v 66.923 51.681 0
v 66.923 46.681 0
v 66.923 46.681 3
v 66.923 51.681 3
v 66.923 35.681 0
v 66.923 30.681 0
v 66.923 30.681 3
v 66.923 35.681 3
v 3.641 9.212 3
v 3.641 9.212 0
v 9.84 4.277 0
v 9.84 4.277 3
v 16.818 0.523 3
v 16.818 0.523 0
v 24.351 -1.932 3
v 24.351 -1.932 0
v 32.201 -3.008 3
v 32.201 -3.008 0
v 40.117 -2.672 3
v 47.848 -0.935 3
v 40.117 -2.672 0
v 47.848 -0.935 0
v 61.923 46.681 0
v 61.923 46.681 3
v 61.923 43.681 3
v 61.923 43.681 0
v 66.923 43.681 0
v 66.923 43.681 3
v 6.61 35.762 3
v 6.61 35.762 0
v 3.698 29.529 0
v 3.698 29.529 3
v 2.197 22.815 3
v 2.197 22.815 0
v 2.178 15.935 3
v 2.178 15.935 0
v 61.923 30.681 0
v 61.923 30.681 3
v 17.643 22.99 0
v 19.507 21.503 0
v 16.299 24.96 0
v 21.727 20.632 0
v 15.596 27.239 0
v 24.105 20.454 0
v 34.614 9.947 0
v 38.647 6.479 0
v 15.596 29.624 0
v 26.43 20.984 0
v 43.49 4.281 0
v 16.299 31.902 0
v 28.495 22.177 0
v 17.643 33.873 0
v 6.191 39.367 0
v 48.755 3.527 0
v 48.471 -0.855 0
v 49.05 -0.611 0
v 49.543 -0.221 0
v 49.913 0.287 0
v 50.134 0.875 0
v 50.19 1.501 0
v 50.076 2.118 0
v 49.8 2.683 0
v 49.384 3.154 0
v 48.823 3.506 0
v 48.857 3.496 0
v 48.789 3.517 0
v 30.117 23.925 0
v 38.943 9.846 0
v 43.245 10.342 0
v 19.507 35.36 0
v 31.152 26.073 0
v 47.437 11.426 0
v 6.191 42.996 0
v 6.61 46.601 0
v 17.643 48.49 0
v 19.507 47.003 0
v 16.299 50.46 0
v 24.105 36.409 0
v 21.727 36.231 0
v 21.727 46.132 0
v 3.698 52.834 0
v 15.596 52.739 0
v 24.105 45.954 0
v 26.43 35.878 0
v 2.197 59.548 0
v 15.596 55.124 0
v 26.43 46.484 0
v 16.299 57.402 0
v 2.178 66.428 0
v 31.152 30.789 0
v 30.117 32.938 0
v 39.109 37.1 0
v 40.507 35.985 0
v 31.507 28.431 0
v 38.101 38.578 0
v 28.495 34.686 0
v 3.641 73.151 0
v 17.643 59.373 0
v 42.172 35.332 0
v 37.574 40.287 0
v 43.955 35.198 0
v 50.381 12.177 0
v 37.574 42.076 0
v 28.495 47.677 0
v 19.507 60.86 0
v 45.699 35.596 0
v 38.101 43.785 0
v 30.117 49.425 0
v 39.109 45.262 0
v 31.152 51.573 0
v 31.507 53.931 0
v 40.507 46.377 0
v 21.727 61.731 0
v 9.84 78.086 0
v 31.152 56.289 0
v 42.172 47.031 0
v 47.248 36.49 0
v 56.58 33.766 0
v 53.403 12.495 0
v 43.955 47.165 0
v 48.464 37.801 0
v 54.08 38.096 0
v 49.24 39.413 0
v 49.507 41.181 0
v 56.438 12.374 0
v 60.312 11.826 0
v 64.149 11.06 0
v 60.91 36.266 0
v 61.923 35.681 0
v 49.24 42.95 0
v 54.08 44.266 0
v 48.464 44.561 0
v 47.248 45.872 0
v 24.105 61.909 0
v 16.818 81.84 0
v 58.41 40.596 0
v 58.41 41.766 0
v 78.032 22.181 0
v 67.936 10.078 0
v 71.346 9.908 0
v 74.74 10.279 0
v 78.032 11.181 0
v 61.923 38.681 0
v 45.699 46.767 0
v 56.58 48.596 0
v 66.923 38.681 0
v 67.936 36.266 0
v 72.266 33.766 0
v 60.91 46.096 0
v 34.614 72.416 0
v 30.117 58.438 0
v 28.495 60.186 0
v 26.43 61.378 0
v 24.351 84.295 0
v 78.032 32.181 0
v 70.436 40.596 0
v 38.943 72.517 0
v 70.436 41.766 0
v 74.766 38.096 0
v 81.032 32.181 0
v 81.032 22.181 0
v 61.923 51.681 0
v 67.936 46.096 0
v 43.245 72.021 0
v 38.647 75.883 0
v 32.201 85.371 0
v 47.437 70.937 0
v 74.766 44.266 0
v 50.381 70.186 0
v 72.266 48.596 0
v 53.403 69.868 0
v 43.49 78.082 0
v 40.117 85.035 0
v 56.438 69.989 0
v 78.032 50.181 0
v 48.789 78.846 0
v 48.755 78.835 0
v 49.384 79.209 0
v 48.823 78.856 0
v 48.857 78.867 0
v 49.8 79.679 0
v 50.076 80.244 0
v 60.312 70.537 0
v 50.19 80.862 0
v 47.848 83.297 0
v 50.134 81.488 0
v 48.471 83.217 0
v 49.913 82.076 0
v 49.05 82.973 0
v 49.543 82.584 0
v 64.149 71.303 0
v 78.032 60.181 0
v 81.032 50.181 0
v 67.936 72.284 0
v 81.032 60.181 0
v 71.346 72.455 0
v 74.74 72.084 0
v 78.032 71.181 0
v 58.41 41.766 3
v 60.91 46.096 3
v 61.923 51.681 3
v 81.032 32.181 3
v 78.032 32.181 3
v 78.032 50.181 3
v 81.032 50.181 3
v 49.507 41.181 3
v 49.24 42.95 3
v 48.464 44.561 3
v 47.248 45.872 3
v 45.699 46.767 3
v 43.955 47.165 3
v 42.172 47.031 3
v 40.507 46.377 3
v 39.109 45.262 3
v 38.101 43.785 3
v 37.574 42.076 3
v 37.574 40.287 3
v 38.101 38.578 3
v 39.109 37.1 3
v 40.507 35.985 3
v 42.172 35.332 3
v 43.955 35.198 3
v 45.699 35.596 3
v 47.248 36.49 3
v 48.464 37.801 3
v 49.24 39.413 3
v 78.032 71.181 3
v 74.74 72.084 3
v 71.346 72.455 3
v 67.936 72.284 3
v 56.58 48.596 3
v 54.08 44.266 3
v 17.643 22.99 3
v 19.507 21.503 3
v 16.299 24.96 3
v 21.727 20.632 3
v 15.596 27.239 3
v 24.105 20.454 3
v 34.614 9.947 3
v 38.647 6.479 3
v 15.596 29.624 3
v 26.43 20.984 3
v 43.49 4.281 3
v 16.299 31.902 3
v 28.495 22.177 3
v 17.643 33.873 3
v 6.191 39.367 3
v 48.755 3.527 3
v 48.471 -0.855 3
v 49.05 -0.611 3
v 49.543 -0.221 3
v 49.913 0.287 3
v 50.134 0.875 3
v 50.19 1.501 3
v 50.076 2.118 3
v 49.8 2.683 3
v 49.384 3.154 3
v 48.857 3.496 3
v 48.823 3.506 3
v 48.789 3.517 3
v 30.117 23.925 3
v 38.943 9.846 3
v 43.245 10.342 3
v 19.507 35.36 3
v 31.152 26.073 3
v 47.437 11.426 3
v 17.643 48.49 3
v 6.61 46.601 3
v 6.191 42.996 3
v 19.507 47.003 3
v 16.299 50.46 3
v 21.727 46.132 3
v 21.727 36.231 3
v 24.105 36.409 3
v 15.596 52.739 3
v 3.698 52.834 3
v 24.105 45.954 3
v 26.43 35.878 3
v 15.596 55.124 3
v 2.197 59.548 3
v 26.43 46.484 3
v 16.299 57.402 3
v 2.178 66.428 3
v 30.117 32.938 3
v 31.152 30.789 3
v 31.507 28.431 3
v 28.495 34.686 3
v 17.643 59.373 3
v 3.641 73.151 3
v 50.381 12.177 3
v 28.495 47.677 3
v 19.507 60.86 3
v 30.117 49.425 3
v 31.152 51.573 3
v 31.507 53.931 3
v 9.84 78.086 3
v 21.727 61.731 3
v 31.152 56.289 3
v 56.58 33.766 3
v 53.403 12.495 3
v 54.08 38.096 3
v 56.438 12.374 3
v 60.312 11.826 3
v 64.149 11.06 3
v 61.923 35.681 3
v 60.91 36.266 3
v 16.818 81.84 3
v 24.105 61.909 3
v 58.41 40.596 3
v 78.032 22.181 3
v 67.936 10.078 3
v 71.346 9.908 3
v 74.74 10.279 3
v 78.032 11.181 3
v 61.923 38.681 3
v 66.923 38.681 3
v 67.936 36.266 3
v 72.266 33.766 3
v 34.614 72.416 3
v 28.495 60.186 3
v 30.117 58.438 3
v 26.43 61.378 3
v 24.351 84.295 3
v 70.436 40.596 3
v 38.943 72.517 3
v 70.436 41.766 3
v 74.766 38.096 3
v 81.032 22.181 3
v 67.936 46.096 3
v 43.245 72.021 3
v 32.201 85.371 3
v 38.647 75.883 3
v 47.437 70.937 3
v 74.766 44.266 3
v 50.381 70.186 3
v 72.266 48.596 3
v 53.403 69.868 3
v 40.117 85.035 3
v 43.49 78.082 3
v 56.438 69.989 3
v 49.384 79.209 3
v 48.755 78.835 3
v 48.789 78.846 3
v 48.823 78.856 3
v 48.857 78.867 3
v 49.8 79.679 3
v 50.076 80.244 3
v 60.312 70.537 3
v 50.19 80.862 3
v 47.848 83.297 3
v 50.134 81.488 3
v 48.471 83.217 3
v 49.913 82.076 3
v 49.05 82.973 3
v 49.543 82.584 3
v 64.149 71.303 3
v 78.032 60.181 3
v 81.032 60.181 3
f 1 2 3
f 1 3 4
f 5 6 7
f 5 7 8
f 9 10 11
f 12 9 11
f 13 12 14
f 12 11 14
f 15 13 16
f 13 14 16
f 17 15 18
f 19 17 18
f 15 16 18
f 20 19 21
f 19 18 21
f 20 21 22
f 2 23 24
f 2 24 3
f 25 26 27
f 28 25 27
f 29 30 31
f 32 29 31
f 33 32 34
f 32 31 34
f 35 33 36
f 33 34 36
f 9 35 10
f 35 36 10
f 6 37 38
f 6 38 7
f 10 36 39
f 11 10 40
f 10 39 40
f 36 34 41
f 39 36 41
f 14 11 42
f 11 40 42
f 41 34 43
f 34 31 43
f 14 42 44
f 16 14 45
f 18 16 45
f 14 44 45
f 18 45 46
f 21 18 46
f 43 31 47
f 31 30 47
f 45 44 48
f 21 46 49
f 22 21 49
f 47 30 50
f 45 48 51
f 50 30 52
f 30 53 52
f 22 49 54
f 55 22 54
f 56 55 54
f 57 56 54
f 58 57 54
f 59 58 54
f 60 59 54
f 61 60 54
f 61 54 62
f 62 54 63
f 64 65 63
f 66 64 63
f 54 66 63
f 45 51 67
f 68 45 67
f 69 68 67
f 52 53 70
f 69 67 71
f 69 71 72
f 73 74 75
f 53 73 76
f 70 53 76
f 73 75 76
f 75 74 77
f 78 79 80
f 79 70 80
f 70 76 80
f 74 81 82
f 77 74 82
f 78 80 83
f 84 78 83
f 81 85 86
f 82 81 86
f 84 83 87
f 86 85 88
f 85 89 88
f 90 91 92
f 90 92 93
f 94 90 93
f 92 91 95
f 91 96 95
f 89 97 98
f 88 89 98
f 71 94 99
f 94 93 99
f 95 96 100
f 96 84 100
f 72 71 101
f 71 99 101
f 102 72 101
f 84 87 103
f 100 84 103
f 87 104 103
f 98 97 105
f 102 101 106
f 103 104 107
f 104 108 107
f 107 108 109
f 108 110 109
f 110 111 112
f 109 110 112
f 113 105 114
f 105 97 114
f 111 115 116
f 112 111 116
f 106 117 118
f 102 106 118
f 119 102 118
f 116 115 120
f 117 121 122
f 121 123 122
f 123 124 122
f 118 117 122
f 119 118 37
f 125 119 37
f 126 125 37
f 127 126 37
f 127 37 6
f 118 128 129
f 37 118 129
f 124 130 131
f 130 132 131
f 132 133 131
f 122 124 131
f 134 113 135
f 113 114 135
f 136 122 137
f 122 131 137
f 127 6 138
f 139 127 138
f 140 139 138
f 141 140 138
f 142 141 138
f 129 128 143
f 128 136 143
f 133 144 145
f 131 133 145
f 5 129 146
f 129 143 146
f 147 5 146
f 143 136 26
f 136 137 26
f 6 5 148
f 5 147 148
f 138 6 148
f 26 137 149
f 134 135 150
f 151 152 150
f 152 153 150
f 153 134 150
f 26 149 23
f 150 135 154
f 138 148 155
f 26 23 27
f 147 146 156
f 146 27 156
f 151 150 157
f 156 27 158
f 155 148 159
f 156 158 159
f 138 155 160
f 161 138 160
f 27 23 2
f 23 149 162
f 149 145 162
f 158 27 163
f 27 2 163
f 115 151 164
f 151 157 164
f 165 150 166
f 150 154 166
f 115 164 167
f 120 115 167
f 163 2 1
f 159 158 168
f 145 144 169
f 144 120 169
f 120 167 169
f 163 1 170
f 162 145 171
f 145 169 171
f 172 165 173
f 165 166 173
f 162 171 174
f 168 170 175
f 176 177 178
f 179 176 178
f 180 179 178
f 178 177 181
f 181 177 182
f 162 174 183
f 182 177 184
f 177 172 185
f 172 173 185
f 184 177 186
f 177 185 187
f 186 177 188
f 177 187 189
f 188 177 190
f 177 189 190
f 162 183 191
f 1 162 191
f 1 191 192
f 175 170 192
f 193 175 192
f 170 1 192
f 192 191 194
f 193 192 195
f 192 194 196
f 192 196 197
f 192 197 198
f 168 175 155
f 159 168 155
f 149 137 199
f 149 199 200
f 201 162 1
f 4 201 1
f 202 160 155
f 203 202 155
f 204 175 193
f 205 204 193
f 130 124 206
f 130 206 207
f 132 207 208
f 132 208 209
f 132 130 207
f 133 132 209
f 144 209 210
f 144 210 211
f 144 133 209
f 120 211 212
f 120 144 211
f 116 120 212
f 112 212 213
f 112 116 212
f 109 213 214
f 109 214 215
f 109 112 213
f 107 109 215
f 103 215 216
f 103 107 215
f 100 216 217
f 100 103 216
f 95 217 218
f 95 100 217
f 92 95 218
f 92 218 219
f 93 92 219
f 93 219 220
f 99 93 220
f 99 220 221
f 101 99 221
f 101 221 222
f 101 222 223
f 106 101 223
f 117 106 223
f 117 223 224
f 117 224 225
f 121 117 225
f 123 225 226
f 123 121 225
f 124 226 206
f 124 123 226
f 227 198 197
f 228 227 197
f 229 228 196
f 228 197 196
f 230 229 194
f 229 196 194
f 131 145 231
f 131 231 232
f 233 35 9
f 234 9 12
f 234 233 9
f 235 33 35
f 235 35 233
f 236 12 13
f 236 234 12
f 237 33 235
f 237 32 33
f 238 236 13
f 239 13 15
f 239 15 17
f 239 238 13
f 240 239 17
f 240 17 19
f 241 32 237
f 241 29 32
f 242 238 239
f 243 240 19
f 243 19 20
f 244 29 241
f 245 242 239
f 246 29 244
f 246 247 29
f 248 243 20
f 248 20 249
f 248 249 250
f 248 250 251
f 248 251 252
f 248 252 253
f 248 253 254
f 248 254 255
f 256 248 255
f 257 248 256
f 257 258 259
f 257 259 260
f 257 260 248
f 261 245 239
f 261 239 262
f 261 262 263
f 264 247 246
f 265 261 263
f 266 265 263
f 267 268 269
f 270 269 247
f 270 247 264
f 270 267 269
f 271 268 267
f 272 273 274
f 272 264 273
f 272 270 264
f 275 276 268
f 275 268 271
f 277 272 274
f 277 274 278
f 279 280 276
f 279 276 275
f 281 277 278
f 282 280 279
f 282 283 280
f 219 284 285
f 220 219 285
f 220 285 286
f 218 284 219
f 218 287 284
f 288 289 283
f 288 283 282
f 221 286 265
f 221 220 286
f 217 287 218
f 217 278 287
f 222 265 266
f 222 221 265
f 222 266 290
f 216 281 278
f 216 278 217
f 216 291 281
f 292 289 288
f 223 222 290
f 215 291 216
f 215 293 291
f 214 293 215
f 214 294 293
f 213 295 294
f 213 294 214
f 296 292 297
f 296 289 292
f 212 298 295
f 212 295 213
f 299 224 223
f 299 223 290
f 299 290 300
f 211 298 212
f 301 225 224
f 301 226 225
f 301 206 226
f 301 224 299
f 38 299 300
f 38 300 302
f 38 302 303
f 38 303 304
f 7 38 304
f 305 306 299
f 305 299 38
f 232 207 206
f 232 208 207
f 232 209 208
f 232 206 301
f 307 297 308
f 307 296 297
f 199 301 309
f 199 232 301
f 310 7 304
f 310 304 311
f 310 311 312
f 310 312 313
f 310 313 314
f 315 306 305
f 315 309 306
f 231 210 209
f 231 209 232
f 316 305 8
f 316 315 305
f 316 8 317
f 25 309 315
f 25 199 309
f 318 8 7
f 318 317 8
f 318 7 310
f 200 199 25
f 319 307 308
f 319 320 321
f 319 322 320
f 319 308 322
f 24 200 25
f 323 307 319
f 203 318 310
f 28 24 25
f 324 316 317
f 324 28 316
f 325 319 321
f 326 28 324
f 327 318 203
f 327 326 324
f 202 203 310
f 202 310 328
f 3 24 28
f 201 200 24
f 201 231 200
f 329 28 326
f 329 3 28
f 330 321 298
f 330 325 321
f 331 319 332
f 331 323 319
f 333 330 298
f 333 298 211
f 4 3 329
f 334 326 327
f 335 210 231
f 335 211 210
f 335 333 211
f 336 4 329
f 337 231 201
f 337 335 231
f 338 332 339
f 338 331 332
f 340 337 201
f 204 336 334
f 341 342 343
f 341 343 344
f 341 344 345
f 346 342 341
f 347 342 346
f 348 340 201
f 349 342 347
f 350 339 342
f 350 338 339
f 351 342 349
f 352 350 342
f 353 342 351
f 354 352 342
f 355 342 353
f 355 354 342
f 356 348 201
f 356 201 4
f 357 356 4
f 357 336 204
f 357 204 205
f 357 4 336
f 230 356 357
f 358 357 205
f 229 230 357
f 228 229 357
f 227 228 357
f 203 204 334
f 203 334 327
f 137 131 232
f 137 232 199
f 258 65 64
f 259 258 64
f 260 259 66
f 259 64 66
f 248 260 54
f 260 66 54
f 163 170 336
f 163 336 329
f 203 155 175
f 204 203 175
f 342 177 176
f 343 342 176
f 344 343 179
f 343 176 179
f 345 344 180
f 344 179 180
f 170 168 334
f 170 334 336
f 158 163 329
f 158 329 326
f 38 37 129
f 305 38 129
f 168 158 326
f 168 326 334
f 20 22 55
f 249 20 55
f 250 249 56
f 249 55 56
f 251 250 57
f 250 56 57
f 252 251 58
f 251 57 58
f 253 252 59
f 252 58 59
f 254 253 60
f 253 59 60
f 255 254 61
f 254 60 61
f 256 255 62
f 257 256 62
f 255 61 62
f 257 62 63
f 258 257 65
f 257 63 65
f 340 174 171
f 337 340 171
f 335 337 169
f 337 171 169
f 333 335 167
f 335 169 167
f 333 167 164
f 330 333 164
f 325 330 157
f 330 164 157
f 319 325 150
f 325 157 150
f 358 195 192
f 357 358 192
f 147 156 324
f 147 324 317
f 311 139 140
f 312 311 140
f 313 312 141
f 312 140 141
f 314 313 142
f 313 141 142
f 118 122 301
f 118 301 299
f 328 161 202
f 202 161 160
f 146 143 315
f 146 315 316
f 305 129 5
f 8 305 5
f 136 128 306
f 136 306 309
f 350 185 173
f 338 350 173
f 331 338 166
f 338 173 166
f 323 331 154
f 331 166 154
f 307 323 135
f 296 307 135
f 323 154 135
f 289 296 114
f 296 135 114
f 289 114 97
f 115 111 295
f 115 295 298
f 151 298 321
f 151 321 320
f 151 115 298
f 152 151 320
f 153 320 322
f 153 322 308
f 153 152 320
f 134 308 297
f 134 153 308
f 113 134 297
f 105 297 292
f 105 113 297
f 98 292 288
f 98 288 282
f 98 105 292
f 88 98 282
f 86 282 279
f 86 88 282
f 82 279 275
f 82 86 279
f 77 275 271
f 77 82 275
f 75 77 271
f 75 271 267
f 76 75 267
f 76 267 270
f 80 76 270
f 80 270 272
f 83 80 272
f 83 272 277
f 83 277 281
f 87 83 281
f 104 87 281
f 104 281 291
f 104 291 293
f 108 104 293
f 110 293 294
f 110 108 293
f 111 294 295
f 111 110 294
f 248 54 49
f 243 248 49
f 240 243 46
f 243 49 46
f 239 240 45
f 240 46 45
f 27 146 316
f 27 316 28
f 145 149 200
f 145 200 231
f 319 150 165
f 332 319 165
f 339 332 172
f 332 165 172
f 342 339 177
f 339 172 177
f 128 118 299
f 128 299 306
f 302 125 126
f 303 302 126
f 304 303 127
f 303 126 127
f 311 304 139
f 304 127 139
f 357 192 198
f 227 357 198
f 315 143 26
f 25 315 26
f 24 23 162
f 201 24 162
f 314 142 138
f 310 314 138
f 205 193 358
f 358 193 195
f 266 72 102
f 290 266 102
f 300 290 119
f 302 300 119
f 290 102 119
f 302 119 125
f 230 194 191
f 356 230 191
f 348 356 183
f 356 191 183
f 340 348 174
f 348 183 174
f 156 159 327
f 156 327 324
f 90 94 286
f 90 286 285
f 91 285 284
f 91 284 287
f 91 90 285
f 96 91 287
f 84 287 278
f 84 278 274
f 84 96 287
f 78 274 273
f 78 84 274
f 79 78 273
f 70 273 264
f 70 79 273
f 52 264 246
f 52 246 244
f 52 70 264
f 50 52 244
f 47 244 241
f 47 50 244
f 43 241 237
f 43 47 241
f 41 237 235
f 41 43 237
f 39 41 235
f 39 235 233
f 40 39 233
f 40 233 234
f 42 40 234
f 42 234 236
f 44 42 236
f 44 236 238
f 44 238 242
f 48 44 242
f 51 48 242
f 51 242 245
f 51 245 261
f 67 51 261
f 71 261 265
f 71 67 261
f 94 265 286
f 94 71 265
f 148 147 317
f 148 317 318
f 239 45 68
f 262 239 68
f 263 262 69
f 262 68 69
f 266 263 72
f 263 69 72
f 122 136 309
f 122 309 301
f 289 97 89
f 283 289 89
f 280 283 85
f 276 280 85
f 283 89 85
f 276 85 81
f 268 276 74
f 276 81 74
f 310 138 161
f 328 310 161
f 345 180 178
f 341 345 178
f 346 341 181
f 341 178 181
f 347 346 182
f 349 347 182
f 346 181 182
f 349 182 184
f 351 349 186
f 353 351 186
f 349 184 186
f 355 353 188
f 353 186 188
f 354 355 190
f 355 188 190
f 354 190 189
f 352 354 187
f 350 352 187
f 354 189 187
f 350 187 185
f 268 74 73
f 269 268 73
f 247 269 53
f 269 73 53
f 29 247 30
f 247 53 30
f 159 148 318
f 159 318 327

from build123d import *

# Parameters (mm, degrees)
SKETCH2_R           = 8
SKETCH2_R_2         = 6
SKETCH2_W           = 5
SKETCH2_H           = 5
BOSS_EXTRUDE1_DEPTH = 3


with BuildPart() as part:
    # Sketch2 → Boss-Extrude1 (new body)
    with BuildSketch(Plane.XY):
        with BuildLine():
            Line((81.032103119, 50.181312), (81.032103119, 60.181312))
            Line((81.032103119, 60.181312), (78.032103119, 60.181312))
            Line((78.032103119, 60.181312), (78.032103119, 71.181312))
            ThreePointArc((78.032103119, 71.181312), (73.050090858, 72.33654353), (67.936161846, 72.284235691))
            ThreePointArc((67.936161846, 72.284235691), (62.235942644, 70.892785416), (56.438402104, 69.988818319))
            ThreePointArc((56.438402104, 69.988818319), (51.886102873, 69.971964975), (47.437133801, 70.93653043))
            ThreePointArc((47.437133801, 70.93653043), (41.102316828, 72.343050119), (34.613643935, 72.416041905))
            ThreePointArc((34.613643935, 72.416041905), (40.990344282, 77.154811793), (48.755286163, 78.83526559))
            ThreePointArc((48.755286163, 78.83526559), (48.80614848, 78.851120911), (48.85704212, 78.866875402))
            ThreePointArc((48.85704212, 78.866875402), (50.134187725, 81.487874692), (47.847872498, 83.297156554))
            ThreePointArc((47.847872498, 83.297156554), (24.351235249, 84.294658733), (3.641458375, 73.150507154))
            ThreePointArc((3.641458375, 73.150507154), (2.19654611, 59.548103084), (6.61028157, 46.600821237))
            ThreePointArc((6.61028157, 46.600821237), (6.138572184, 41.181312), (6.61028157, 35.761802763))
            ThreePointArc((6.61028157, 35.761802763), (2.19654611, 22.814520916), (3.641458375, 9.212116846))
            ThreePointArc((3.641458375, 9.212116846), (24.351235249, -1.932034733), (47.847872498, -0.934532554))
            ThreePointArc((47.847872498, -0.934532554), (50.134187725, 0.874749308), (48.85704212, 3.495748598))
            ThreePointArc((48.85704212, 3.495748598), (48.80614848, 3.511503089), (48.755286163, 3.52735841))
            ThreePointArc((48.755286163, 3.52735841), (40.990344282, 5.207812207), (34.613643935, 9.946582095))
            ThreePointArc((34.613643935, 9.946582095), (41.102316828, 10.019573881), (47.437133801, 11.42609357))
            ThreePointArc((47.437133801, 11.42609357), (51.886102873, 12.390659025), (56.438402104, 12.373805681))
            ThreePointArc((56.438402104, 12.373805681), (62.235942644, 11.469838584), (67.936161846, 10.078388309))
            ThreePointArc((67.936161846, 10.078388309), (73.050090858, 10.02608047), (78.032103119, 11.181312))
            Line((78.032103119, 11.181312), (78.032103119, 22.181312))
            Line((78.032103119, 22.181312), (81.032103119, 22.181312))
            Line((81.032103119, 22.181312), (81.032103119, 32.181312))
            Line((81.032103119, 32.181312), (78.032103119, 32.181312))
            Line((78.032103119, 32.181312), (78.032103119, 50.181312))
            Line((78.032103119, 50.181312), (81.032103119, 50.181312))
        make_face()
        with Locations((23.507028058, 53.931312)):
            Circle(SKETCH2_R, mode=Mode.SUBTRACT)
        with Locations((43.507028058, 41.181312)):
            Circle(SKETCH2_R_2, mode=Mode.SUBTRACT)
        with Locations((23.507028058, 28.431312)):
            Circle(SKETCH2_R, mode=Mode.SUBTRACT)
        with Locations((64.423022125, 41.181312)):
            Rectangle(SKETCH2_W, SKETCH2_H, mode=Mode.SUBTRACT)
        with Locations((64.423022125, 33.181312)):
            Rectangle(SKETCH2_W, SKETCH2_H, mode=Mode.SUBTRACT)
        Polygon((72.266288865, 48.59637551), (67.936161846, 46.09637551), (70.436161846, 41.766248491), (74.766288865, 44.266248491), align=None, mode=Mode.SUBTRACT)
        Polygon((67.936161846, 36.266248491), (72.266288865, 33.766248491), (74.766288865, 38.09637551), (70.436161846, 40.596375509), align=None, mode=Mode.SUBTRACT)
        with Locations((64.423022125, 49.181312)):
            Rectangle(SKETCH2_W, SKETCH2_H, mode=Mode.SUBTRACT)
        Polygon((56.579755385, 33.766248491), (60.909882404, 36.266248491), (58.409882404, 40.59637551), (54.079755385, 38.09637551), align=None, mode=Mode.SUBTRACT)
        Polygon((60.909882404, 46.09637551), (56.579755385, 48.596375509), (54.079755385, 44.266248491), (58.409882404, 41.766248491), align=None, mode=Mode.SUBTRACT)
    extrude(amount=BOSS_EXTRUDE1_DEPTH)


solid = part.part
